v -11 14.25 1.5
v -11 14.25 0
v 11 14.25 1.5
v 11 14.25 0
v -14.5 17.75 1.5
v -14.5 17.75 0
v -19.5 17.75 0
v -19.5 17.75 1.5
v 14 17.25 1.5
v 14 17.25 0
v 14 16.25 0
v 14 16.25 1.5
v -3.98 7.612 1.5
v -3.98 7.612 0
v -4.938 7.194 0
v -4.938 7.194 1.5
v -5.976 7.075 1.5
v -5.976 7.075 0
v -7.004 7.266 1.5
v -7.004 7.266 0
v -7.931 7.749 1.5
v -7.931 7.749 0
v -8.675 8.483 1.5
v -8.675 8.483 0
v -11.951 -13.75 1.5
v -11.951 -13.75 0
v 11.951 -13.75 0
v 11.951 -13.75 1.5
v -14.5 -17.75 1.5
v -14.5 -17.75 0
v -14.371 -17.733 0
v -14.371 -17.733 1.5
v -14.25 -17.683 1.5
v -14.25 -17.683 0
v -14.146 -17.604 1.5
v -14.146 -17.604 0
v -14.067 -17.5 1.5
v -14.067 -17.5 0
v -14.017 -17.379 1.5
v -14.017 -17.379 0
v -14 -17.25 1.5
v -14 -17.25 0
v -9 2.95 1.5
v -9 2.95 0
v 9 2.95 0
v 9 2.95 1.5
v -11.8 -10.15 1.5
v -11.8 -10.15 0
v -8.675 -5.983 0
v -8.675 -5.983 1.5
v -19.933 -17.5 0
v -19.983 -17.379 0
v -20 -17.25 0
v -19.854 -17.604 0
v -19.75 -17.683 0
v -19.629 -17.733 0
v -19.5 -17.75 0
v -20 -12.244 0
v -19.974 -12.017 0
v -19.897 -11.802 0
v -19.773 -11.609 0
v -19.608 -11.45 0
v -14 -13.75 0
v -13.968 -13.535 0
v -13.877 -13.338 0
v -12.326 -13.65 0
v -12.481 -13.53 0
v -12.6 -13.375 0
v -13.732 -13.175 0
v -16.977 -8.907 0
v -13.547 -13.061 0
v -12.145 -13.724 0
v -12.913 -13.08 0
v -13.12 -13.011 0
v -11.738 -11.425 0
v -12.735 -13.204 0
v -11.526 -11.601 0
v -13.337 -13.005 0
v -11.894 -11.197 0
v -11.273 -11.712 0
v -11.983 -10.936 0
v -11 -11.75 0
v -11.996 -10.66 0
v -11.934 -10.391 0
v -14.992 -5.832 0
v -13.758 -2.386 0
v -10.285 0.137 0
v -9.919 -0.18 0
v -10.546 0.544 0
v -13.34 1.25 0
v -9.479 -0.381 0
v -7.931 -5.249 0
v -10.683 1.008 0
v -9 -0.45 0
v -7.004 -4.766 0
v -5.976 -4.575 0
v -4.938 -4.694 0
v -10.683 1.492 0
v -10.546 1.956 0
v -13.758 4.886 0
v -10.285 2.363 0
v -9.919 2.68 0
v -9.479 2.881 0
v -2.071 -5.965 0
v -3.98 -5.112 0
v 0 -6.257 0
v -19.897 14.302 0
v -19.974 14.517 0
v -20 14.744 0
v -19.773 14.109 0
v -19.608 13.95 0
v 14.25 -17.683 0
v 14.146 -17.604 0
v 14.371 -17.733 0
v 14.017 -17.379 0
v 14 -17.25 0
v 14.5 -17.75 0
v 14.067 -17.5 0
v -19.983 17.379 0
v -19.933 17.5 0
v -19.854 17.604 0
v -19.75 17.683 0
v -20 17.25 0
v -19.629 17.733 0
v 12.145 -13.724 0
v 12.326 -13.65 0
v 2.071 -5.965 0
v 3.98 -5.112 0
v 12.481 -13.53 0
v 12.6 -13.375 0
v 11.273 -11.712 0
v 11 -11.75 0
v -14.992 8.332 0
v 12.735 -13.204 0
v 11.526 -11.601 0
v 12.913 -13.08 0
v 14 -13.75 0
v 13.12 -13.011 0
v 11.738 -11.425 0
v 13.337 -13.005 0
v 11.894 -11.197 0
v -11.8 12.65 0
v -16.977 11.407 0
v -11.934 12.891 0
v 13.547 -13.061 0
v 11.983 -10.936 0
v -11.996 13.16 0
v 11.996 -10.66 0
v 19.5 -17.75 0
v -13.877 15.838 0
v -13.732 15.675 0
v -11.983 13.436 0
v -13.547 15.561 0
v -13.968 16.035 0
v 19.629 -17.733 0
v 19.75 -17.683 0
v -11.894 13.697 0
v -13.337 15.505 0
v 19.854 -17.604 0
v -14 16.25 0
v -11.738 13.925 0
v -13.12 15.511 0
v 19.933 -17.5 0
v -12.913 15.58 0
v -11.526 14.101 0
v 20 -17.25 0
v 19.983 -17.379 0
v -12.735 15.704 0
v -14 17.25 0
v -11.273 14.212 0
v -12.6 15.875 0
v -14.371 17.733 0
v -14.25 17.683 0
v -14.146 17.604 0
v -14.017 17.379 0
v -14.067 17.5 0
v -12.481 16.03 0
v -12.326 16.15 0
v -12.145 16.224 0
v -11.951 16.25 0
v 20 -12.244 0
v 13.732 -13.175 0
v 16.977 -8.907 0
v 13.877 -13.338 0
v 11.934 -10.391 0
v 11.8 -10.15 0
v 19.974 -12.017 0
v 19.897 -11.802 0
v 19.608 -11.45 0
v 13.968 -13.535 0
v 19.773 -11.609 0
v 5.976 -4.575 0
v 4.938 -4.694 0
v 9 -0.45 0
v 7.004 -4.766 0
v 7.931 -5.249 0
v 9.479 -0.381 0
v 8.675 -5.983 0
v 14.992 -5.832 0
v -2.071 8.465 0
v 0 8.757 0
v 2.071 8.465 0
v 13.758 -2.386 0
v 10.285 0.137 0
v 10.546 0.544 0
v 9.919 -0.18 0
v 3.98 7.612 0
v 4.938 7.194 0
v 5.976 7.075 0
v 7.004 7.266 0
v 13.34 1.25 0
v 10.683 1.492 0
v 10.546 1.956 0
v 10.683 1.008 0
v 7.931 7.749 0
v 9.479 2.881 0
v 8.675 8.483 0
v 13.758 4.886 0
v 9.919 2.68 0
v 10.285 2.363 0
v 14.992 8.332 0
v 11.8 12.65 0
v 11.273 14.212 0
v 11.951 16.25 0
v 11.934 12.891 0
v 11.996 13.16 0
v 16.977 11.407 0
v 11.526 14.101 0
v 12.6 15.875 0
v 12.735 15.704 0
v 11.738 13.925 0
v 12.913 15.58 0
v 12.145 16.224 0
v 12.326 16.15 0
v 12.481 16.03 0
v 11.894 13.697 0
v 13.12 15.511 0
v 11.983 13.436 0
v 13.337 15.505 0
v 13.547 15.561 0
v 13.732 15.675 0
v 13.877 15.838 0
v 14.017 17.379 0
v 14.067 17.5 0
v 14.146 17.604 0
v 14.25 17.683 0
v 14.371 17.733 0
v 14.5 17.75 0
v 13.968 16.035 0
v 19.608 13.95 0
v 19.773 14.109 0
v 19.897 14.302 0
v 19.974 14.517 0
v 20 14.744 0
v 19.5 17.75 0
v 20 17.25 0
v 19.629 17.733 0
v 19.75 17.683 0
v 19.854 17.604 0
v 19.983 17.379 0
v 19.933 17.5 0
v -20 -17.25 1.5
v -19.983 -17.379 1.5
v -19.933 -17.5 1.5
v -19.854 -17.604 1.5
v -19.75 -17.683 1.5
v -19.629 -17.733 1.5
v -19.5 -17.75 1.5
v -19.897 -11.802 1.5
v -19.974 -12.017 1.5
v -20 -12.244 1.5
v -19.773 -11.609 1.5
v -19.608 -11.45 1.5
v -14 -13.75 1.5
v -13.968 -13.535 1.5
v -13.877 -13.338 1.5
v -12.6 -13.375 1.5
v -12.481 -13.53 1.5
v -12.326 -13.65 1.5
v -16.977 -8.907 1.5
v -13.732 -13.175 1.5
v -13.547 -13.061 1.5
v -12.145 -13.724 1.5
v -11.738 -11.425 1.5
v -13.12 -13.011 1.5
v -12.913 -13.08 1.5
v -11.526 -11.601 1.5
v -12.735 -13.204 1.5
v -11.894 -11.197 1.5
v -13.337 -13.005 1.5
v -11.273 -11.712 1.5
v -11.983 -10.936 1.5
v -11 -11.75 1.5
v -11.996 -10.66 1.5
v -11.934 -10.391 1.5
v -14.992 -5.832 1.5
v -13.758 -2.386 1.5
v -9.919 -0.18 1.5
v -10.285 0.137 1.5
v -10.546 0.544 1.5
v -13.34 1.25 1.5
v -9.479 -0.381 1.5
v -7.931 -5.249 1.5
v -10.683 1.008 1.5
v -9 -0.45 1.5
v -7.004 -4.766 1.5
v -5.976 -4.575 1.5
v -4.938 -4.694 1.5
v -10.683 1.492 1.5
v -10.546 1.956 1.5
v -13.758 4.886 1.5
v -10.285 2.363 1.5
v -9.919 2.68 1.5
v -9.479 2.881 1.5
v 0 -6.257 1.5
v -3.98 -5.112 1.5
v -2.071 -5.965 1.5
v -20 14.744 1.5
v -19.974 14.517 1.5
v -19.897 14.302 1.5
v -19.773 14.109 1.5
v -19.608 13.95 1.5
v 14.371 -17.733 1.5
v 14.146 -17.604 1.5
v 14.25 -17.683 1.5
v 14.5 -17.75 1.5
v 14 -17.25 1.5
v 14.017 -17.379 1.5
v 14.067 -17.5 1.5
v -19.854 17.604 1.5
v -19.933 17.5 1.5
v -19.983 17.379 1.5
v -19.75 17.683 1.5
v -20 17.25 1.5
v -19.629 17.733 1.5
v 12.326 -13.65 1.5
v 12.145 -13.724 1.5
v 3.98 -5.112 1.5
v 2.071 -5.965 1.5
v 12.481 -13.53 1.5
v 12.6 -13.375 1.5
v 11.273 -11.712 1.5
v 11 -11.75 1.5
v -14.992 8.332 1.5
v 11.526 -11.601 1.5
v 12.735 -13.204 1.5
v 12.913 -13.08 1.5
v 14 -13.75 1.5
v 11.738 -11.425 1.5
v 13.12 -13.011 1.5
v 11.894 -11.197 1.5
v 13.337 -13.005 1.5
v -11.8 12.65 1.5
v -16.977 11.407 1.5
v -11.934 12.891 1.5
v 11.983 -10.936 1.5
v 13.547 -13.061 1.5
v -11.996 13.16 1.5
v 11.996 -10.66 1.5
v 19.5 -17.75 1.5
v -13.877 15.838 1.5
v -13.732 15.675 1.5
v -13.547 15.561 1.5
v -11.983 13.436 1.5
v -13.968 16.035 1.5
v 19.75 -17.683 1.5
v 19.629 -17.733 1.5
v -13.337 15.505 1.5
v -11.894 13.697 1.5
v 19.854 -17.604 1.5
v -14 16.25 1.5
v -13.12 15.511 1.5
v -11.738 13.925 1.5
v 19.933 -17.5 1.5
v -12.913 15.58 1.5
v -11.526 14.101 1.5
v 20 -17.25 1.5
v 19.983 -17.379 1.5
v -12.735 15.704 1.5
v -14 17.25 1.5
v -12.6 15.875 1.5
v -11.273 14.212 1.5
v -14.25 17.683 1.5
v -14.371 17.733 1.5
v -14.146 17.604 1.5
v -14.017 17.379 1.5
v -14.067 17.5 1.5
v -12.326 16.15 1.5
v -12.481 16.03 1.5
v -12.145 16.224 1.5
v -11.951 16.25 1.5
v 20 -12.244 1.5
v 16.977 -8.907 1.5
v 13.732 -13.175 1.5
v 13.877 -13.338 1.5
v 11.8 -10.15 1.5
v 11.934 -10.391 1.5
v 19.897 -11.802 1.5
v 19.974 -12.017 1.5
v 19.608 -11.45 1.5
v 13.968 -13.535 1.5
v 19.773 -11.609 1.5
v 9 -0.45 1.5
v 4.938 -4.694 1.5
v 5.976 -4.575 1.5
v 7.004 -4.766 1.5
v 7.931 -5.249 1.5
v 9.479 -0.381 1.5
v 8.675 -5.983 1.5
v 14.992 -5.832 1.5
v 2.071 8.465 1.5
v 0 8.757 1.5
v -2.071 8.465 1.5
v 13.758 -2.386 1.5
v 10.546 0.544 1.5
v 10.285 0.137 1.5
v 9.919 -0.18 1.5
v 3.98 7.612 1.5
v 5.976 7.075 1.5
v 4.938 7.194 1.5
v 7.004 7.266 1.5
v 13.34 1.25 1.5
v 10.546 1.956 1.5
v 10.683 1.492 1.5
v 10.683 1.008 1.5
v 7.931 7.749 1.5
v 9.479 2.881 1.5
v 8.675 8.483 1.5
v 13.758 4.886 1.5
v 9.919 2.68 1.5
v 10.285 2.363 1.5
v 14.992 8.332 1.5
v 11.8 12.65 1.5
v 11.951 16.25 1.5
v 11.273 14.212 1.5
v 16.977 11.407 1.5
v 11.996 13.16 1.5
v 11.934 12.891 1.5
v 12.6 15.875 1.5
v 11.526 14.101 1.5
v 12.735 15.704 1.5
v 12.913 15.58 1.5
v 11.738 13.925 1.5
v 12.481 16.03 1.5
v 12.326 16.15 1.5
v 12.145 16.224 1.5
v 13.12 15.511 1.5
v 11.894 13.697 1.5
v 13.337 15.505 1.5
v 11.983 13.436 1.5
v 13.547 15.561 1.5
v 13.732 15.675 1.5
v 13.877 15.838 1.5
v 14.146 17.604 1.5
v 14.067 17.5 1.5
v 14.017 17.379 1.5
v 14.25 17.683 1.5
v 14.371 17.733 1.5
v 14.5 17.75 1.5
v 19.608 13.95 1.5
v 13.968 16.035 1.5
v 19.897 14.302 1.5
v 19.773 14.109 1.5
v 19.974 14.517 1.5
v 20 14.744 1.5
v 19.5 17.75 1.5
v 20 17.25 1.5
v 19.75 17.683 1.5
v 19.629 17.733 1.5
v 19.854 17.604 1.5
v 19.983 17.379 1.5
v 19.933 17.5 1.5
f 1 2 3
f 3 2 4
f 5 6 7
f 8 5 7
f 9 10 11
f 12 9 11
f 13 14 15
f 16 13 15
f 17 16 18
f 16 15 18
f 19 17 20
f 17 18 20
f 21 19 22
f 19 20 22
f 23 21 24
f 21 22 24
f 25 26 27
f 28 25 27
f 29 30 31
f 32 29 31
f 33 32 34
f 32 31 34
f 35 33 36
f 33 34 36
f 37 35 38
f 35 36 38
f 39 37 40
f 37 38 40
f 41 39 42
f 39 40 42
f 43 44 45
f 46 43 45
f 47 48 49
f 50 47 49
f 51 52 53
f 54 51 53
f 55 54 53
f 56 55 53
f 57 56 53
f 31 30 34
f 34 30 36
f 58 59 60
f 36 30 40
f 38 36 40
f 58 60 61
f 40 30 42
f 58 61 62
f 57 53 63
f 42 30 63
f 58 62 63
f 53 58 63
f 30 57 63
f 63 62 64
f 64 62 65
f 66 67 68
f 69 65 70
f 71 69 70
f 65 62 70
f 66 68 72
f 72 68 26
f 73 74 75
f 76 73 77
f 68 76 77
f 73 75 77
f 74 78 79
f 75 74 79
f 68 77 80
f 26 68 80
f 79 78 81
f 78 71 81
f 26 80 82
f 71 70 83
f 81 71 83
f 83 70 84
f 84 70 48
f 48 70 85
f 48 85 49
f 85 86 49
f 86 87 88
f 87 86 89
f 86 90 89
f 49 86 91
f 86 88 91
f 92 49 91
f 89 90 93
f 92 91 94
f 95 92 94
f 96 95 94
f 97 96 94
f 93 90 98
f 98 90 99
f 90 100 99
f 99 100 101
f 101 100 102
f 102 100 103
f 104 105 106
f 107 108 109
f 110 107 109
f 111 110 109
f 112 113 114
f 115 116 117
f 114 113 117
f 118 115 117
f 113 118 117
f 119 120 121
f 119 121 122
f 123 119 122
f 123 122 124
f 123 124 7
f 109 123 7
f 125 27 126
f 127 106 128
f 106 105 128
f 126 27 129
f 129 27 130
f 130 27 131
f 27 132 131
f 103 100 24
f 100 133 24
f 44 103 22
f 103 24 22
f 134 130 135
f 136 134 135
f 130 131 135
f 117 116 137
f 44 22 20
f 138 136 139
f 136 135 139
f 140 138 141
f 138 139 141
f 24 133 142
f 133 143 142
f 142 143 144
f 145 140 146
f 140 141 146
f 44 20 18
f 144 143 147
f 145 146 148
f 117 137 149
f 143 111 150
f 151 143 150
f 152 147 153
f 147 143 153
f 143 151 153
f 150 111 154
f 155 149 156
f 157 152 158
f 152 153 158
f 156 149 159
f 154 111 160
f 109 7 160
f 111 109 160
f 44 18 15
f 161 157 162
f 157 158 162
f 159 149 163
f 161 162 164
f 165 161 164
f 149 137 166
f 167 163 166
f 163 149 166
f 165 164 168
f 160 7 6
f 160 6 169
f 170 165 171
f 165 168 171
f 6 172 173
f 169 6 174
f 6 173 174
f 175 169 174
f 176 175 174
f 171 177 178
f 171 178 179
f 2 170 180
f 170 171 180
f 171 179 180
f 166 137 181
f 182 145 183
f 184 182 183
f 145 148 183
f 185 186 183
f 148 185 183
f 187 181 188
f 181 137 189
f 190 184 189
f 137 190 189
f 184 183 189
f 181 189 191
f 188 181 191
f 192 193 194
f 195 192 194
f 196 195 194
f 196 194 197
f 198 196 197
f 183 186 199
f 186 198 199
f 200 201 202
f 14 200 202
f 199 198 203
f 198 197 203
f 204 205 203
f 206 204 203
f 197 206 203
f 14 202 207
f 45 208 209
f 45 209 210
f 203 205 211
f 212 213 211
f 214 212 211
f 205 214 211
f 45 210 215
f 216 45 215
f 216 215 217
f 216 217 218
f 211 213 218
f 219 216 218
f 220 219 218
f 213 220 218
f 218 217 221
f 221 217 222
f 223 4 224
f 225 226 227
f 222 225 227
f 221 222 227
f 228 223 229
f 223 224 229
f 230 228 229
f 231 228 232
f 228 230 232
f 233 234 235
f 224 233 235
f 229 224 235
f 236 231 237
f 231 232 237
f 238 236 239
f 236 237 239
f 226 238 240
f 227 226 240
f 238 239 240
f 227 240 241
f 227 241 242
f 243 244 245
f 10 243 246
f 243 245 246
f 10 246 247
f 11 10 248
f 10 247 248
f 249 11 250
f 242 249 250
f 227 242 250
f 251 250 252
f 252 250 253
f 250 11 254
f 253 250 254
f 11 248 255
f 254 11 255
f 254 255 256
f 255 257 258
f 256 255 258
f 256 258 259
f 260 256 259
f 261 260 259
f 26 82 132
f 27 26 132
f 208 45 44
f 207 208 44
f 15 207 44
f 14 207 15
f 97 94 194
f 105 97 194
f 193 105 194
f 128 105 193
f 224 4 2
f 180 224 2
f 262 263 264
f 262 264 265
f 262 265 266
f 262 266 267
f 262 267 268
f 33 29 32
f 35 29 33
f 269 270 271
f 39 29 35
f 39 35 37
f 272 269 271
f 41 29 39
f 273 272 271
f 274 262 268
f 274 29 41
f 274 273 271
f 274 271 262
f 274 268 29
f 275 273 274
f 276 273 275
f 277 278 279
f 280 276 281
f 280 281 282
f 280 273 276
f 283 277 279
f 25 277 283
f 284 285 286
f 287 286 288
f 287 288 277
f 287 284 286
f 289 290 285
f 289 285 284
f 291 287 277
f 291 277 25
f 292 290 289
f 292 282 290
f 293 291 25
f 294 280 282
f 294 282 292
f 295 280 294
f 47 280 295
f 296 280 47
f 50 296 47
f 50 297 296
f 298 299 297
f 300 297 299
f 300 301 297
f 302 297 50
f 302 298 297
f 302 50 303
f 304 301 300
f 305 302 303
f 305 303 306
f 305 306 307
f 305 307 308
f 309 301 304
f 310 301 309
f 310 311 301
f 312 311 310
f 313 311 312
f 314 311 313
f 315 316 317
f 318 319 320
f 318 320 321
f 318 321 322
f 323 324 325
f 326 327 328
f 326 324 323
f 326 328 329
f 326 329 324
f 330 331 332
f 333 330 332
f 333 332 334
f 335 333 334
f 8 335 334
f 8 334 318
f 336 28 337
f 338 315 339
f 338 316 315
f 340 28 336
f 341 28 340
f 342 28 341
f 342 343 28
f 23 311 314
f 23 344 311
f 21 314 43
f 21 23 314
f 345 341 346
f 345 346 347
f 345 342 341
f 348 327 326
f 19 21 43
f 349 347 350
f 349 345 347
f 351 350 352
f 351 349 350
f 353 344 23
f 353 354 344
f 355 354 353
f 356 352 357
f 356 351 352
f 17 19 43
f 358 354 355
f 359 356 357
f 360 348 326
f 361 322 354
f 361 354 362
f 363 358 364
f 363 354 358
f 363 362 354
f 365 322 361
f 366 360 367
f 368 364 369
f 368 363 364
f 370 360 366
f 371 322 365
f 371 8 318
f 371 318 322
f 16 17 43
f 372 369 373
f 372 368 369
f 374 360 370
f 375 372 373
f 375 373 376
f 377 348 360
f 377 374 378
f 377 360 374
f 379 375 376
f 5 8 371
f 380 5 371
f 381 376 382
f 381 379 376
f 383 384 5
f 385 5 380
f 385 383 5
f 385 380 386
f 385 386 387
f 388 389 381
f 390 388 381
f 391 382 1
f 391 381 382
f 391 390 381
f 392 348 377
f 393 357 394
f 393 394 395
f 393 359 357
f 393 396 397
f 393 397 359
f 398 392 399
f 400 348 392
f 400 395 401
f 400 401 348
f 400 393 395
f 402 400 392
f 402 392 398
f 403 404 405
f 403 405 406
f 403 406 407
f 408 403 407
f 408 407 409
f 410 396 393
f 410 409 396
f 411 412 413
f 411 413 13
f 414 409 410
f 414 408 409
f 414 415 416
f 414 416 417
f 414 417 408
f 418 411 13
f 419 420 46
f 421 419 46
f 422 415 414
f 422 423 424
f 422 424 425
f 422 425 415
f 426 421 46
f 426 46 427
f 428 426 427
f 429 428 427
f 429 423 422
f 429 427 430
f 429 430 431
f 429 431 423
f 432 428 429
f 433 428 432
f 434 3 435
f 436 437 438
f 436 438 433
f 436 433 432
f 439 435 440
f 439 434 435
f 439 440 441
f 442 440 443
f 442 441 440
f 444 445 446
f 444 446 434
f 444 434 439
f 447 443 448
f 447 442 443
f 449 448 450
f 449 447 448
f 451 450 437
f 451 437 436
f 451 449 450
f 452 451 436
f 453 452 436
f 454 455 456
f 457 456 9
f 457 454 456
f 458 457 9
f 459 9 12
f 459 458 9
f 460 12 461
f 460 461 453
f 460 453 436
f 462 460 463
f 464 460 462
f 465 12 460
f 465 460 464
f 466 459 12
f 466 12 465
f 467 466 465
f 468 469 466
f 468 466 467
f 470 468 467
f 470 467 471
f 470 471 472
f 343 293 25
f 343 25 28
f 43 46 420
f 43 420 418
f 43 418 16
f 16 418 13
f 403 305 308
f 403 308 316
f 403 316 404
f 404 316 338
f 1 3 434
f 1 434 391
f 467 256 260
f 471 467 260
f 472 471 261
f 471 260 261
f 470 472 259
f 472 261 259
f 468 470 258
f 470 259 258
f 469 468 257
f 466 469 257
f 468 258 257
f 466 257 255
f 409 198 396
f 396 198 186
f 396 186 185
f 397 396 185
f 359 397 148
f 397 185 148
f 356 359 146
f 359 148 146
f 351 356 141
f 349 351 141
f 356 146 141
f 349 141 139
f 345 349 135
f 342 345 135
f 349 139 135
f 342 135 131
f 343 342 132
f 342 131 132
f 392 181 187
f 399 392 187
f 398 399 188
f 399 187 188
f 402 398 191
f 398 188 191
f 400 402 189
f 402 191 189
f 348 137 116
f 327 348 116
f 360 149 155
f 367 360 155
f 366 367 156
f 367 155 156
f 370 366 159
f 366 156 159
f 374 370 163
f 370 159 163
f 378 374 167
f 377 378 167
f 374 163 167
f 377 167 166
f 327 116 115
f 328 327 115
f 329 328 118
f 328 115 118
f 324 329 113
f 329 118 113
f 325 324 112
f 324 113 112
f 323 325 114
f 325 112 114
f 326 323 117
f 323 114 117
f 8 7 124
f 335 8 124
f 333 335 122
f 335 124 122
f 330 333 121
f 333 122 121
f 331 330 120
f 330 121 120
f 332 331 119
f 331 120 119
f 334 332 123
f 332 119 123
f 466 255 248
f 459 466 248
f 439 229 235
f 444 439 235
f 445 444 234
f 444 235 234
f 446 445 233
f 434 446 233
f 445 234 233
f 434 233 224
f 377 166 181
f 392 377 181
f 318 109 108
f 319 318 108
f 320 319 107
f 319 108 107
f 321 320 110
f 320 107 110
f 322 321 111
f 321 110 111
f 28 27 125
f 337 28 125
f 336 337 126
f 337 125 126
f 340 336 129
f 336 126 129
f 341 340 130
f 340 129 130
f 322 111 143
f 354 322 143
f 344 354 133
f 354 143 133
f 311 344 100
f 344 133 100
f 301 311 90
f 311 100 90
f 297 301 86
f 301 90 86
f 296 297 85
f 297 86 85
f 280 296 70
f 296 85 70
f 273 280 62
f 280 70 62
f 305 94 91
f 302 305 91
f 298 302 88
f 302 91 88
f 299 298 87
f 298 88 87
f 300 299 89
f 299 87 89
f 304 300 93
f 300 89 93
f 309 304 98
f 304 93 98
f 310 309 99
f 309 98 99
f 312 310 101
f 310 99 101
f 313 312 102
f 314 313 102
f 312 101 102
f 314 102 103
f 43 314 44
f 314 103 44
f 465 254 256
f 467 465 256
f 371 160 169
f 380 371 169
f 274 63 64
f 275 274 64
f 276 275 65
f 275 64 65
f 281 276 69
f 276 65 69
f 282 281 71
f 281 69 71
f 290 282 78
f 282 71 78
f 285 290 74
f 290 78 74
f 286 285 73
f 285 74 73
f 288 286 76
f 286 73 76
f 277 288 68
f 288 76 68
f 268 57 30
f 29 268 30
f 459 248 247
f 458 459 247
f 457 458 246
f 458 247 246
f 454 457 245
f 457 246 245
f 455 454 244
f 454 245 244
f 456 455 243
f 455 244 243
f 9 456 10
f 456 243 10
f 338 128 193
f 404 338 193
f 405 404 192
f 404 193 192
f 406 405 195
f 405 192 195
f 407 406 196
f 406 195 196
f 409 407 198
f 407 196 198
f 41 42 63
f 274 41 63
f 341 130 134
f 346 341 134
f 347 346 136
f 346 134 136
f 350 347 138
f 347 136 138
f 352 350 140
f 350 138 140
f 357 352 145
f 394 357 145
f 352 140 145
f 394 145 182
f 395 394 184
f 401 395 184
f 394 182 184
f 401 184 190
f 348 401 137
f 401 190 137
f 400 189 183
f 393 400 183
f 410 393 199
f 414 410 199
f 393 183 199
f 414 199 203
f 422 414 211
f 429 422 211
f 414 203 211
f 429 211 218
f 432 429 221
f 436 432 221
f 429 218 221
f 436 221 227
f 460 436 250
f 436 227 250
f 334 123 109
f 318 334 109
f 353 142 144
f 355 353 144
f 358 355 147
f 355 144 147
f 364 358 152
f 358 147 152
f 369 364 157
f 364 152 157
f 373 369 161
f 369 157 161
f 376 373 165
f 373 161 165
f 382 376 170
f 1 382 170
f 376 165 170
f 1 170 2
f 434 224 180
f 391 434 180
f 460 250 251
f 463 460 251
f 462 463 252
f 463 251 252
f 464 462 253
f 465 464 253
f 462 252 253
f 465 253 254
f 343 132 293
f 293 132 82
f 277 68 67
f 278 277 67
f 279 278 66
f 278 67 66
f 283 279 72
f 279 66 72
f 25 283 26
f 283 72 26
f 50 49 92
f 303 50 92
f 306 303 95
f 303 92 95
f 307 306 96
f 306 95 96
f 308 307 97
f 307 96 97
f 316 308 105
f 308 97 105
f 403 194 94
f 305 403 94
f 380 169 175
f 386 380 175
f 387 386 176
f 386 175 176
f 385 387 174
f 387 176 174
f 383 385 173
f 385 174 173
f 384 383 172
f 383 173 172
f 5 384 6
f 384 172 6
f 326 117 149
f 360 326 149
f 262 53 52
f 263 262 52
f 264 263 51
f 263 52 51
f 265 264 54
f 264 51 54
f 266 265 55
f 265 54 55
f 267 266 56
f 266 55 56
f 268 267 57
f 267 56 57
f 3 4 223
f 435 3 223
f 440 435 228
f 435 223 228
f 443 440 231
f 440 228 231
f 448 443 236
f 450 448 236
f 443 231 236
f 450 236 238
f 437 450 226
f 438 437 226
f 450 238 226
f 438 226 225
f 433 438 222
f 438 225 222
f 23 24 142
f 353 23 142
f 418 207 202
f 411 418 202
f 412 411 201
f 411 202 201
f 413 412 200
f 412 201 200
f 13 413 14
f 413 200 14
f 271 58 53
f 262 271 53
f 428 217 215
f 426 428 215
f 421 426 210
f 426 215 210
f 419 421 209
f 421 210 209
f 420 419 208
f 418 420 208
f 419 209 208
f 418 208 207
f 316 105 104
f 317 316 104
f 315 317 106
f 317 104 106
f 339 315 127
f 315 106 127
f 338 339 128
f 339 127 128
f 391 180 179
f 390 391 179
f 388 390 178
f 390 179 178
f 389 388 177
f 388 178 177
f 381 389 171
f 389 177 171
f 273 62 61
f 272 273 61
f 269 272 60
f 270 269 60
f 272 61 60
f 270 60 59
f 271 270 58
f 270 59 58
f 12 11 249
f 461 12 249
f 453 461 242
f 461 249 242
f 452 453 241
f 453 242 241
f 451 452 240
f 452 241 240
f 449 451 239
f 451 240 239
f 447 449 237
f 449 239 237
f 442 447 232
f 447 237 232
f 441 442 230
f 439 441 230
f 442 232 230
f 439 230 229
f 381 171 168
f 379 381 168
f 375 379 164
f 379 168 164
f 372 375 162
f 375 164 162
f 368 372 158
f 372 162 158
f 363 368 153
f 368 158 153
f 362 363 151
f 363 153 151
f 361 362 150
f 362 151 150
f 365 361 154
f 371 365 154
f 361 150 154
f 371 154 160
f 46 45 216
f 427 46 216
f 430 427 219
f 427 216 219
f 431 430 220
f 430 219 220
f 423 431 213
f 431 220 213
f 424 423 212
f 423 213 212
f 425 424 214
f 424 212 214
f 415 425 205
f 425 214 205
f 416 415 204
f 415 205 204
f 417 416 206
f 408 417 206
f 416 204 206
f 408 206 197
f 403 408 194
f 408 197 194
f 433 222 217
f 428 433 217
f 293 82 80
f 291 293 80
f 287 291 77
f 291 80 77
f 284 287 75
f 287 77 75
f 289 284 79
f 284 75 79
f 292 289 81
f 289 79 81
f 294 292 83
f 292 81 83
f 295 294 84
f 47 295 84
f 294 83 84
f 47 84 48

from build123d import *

# Parameters (mm, degrees)
F1_DEPTH = 1.5


# Not quite as in the source:
# - ends of sketch curves that miss each other by under 0.0002 mm in the source are joined


with BuildPart() as f1:
    # F0 (on Top) → F1 (new body)
    with BuildSketch(Plane.XY):
        with BuildLine():
            ThreePointArc((19.6082164698, -11.4503983868), (13.339608, 1.2499996959), (19.608215987, 13.9503980169))
            ThreePointArc((19.608215987, 13.9503980169), (19.8967236619, 14.3015730303), (20.000004, 14.744172))
            Line((20.000004, 14.744172), (20.000004, 17.25))
            ThreePointArc((20.000004, 17.25), (19.8535573906, 17.6035533906), (19.500004, 17.75))
            Line((19.500004, 17.75), (14.500004, 17.75))
            ThreePointArc((14.500004, 17.75), (14.1464506094, 17.6035533906), (14.000004, 17.25))
            Line((14.000004, 17.25), (14.000004, 16.25))
            ThreePointArc((14.000004, 16.25), (13.4441182966, 15.5255556337), (12.6004849604, 15.8749999771))
            ThreePointArc((12.6004849604, 15.8749999771), (12.3259659886, 16.1495190594), (11.950966, 16.25))
            Line((11.950966, 16.25), (-11.950958, 16.25))
            ThreePointArc((-11.950958, 16.25), (-12.3259579886, 16.1495190594), (-12.6004770396, 15.8750000229))
            ThreePointArc((-12.6004770396, 15.8750000229), (-13.4441102966, 15.5255556337), (-13.999996, 16.25))
            Line((-13.999996, 16.25), (-13.999996, 17.25))
            ThreePointArc((-13.999996, 17.25), (-14.1464426094, 17.6035533906), (-14.499996, 17.75))
            Line((-14.499996, 17.75), (-19.499996, 17.75))
            ThreePointArc((-19.499996, 17.75), (-19.8535493906, 17.6035533906), (-19.999996, 17.25))
            Line((-19.999996, 17.25), (-19.999996, 14.744172))
            ThreePointArc((-19.999996, 14.744172), (-19.8967156619, 14.3015730303), (-19.6082083041, 13.9503976031))
            ThreePointArc((-19.6082083041, 13.9503976031), (-13.3396, 1.2499996959), (-19.6082084698, -11.4503983868))
            ThreePointArc((-19.6082084698, -11.4503983868), (-19.8967227718, -11.8015703601), (-20.000004, -12.244173))
            Line((-20.000004, -12.244173), (-19.999996, -17.25))
            ThreePointArc((-19.999996, -17.25), (-19.8535493906, -17.6035533906), (-19.499996, -17.75))
            Line((-19.499996, -17.75), (-14.499996, -17.75))
            ThreePointArc((-14.499996, -17.75), (-14.1464426094, -17.6035533906), (-13.999996, -17.25))
            Line((-13.999996, -17.25), (-13.999996, -13.75))
            ThreePointArc((-13.999996, -13.75), (-13.4441102966, -13.0255556337), (-12.6004769604, -13.3749999771))
            ThreePointArc((-12.6004769604, -13.3749999771), (-12.3259579886, -13.6495190594), (-11.950958, -13.75))
            Line((-11.950958, -13.75), (11.950966, -13.75))
            ThreePointArc((11.950966, -13.75), (12.3259659886, -13.6495190594), (12.6004850396, -13.3750000229))
            ThreePointArc((12.6004850396, -13.3750000229), (13.4441182966, -13.0255556337), (14.000004, -13.75))
            Line((14.000004, -13.75), (14.000004, -17.25))
            ThreePointArc((14.000004, -17.25), (14.1464506094, -17.6035533906), (14.500004, -17.75))
            Line((14.500004, -17.75), (19.500004, -17.75))
            ThreePointArc((19.500004, -17.75), (19.8535573906, -17.6035533906), (20.000004, -17.25))
            Line((20.000004, -17.25), (20.000004, -12.244173))
            ThreePointArc((20.000004, -12.244173), (19.8967236619, -11.8015740303), (19.6082164698, -11.4503983868))
        make_face()
        with BuildLine():
            ThreePointArc((-8.6748168, -5.9830934), (-6.4973578405, -4.6318753463), (-3.9800720916, -5.1118651461))
            ThreePointArc((-3.9800720916, -5.1118651461), (3.5765e-06, -6.257042), (3.980079547, -5.1118658719))
            ThreePointArc((3.980079547, -5.1118658719), (6.4973651354, -4.631875401), (8.67482416, -5.98309388))
            Line((8.67482416, -5.98309388), (11.800004, -10.15))
            ThreePointArc((11.800004, -10.15), (11.894431191, -11.1972135955), (11.000004, -11.75))
            Line((11.000004, -11.75), (-10.999996, -11.75))
            ThreePointArc((-10.999996, -11.75), (-11.894423191, -11.1972135955), (-11.799996, -10.15))
            Line((-11.799996, -10.15), (-8.6748168, -5.9830934))
        make_face(mode=Mode.SUBTRACT)
        with BuildLine():
            ThreePointArc((9.000004, 2.95), (10.700004, 1.25), (9.000004, -0.45))
            Line((9.000004, -0.45), (-8.999996, -0.45))
            ThreePointArc((-8.999996, -0.45), (-10.699996, 1.25), (-8.999996, 2.95))
            Line((-8.999996, 2.95), (9.000004, 2.95))
        make_face(mode=Mode.SUBTRACT)
        with BuildLine():
            Line((-10.999996, 14.25), (11.000004, 14.25))
            ThreePointArc((11.000004, 14.25), (11.894431191, 13.6972135955), (11.800004, 12.65))
            Line((11.800004, 12.65), (8.674824, 8.483093))
            ThreePointArc((8.674824, 8.483093), (6.4973648742, 7.1318743525), (3.9800786415, 7.6118644285))
            ThreePointArc((3.9800786415, 7.6118644285), (3.5765e-06, 8.757041), (-3.9800718144, 7.6118647041))
            ThreePointArc((-3.9800718144, 7.6118647041), (-6.4973575792, 7.1318742978), (-8.6748168, 8.4830924))
            Line((-8.6748168, 8.4830924), (-11.799996, 12.65))
            ThreePointArc((-11.799996, 12.65), (-11.894423191, 13.6972135955), (-10.999996, 14.25))
        make_face(mode=Mode.SUBTRACT)
    extrude(amount=F1_DEPTH)


solid = f1.part
